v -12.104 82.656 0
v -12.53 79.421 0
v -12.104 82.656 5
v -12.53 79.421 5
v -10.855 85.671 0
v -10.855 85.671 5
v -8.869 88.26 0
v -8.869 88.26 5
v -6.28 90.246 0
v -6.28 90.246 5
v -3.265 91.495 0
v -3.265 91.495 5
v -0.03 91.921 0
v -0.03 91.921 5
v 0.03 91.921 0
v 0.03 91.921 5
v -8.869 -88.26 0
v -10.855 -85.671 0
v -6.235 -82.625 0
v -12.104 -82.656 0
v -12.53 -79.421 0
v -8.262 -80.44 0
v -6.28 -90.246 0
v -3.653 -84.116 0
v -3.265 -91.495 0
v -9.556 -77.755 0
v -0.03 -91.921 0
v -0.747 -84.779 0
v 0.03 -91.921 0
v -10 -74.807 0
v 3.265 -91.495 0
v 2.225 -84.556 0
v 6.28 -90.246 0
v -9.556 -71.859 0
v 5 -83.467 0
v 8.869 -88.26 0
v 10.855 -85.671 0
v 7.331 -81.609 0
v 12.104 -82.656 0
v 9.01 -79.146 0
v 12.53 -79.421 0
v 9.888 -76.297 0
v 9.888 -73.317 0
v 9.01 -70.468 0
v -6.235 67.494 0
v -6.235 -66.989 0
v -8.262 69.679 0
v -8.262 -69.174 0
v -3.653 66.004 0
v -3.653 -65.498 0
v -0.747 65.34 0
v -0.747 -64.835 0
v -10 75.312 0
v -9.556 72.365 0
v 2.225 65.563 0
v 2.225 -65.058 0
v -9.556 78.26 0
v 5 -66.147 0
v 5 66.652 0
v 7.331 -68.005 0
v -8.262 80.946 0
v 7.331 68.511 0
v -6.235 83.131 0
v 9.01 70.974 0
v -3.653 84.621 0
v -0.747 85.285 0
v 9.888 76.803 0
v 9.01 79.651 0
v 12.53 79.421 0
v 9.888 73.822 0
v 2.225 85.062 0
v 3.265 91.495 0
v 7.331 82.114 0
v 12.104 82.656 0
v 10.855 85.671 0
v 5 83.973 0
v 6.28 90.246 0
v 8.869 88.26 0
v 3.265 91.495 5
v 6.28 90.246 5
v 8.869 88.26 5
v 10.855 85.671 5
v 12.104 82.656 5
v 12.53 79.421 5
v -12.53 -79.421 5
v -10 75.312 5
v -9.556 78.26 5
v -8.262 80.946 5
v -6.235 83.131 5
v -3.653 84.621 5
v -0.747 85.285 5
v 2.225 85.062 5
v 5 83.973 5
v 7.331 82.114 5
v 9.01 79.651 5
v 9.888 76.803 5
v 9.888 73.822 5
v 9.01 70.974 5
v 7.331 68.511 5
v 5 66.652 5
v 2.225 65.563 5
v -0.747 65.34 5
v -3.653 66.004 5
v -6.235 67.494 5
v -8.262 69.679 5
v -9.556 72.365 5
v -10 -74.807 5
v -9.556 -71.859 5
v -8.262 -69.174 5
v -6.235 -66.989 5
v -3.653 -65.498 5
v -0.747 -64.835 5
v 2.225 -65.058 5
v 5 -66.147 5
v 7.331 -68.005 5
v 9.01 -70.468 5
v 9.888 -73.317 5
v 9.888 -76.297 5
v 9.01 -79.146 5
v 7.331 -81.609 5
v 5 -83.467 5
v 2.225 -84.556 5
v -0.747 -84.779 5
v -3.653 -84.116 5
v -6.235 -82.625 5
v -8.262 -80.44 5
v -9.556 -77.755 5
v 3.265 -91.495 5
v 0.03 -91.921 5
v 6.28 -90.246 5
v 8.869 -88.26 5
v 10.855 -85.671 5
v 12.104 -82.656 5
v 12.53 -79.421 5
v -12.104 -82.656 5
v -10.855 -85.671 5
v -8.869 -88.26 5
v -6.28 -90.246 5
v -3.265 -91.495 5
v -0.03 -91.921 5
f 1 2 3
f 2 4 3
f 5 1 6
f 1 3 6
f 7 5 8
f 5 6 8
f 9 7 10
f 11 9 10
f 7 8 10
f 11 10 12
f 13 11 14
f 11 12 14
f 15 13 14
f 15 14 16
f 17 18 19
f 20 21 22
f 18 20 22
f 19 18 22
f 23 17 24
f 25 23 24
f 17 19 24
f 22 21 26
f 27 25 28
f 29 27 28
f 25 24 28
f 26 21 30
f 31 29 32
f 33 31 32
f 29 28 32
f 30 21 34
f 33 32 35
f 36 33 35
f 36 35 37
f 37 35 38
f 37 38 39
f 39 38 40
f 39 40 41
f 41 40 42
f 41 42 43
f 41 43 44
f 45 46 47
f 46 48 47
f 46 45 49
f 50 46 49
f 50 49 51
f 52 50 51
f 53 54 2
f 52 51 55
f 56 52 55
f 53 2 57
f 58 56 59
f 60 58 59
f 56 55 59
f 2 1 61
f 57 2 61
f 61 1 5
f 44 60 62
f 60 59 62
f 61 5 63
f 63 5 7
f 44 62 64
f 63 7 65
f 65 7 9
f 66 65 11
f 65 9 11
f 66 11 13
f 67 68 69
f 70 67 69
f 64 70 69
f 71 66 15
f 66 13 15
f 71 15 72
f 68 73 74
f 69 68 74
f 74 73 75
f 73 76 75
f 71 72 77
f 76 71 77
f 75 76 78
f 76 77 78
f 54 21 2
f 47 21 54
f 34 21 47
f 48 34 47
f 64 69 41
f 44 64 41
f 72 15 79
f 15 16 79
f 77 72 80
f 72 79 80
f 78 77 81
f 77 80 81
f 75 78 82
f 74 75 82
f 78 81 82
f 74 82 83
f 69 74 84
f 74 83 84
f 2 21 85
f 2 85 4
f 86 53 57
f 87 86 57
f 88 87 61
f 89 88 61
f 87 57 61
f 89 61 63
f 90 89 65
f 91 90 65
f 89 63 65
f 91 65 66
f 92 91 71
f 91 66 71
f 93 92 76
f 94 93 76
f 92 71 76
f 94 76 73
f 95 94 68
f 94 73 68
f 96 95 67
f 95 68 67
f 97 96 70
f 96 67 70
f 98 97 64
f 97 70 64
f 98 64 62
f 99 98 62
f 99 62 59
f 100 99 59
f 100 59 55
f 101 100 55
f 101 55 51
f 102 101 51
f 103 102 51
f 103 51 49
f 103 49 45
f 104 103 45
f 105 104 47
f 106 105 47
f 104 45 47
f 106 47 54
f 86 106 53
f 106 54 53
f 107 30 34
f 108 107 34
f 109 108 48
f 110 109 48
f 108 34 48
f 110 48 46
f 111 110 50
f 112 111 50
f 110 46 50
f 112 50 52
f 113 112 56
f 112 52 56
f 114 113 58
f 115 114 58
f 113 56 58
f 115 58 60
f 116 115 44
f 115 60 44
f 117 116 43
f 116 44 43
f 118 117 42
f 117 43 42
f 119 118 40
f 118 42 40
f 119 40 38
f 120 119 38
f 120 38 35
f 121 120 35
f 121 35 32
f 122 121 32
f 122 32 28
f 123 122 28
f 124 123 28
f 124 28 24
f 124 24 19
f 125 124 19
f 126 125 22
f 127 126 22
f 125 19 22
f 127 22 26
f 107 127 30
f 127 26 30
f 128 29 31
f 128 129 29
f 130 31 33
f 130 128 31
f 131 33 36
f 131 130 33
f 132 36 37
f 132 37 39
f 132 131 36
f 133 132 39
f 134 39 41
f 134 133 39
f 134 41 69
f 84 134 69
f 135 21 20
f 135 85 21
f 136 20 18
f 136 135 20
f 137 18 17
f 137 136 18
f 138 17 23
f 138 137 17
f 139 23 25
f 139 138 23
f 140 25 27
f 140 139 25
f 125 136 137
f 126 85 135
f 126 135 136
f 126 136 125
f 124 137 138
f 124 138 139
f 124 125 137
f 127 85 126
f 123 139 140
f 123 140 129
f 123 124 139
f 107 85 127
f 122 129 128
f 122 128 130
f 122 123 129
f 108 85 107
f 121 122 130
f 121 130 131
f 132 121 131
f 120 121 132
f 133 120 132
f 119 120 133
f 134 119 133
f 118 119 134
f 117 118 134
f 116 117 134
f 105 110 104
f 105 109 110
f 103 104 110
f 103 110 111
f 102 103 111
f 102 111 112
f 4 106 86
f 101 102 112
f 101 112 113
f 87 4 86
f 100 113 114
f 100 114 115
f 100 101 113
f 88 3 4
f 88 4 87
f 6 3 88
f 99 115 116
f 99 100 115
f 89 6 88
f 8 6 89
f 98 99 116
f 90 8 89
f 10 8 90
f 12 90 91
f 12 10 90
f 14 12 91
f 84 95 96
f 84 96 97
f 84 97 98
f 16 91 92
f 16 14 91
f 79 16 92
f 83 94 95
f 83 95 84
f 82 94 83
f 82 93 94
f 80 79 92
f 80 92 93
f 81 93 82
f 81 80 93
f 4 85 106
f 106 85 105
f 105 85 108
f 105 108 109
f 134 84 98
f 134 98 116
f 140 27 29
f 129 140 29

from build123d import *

# Parameters (mm, degrees)
SKETCH_1_W          = 25.05955055
SKETCH_1_H          = 183.842173556
EXTRUDE_1_DEPTH     = 5
SKETCH_2_R          = 10
CUT_EXTRUDE_1_DEPTH = 5
FILLET_1_R          = 12.5


with BuildPart() as part:
    # 草图1 → 凸台-拉伸1 (new body)
    with BuildSketch(Plane.XY):
        Rectangle(SKETCH_1_W, SKETCH_1_H)
    extrude(amount=EXTRUDE_1_DEPTH)

    # 草图2 → 切除-拉伸1 (cut)
    with BuildSketch(Plane(origin=(0, 0, 0), x_dir=(-1, 0, 0), z_dir=(0, 0, -1))):
        with Locations((0, 75.312469171)):
            Circle(SKETCH_2_R)
        with Locations((0, -74.807016358)):
            Circle(SKETCH_2_R)
    extrude(amount=-CUT_EXTRUDE_1_DEPTH, mode=Mode.SUBTRACT)

    # 圆角1
    fillet_1_edges = [part.edges().sort_by_distance(p)[0] for p in [
        (-12.529775275, 91.921086778, 2.5),
        (12.529775275, 91.921086778, 2.5),
        (12.529775275, -91.921086778, 2.5),
        (-12.529775275, -91.921086778, 2.5),
    ]]
    fillet(fillet_1_edges, radius=FILLET_1_R)


solid = part.part
